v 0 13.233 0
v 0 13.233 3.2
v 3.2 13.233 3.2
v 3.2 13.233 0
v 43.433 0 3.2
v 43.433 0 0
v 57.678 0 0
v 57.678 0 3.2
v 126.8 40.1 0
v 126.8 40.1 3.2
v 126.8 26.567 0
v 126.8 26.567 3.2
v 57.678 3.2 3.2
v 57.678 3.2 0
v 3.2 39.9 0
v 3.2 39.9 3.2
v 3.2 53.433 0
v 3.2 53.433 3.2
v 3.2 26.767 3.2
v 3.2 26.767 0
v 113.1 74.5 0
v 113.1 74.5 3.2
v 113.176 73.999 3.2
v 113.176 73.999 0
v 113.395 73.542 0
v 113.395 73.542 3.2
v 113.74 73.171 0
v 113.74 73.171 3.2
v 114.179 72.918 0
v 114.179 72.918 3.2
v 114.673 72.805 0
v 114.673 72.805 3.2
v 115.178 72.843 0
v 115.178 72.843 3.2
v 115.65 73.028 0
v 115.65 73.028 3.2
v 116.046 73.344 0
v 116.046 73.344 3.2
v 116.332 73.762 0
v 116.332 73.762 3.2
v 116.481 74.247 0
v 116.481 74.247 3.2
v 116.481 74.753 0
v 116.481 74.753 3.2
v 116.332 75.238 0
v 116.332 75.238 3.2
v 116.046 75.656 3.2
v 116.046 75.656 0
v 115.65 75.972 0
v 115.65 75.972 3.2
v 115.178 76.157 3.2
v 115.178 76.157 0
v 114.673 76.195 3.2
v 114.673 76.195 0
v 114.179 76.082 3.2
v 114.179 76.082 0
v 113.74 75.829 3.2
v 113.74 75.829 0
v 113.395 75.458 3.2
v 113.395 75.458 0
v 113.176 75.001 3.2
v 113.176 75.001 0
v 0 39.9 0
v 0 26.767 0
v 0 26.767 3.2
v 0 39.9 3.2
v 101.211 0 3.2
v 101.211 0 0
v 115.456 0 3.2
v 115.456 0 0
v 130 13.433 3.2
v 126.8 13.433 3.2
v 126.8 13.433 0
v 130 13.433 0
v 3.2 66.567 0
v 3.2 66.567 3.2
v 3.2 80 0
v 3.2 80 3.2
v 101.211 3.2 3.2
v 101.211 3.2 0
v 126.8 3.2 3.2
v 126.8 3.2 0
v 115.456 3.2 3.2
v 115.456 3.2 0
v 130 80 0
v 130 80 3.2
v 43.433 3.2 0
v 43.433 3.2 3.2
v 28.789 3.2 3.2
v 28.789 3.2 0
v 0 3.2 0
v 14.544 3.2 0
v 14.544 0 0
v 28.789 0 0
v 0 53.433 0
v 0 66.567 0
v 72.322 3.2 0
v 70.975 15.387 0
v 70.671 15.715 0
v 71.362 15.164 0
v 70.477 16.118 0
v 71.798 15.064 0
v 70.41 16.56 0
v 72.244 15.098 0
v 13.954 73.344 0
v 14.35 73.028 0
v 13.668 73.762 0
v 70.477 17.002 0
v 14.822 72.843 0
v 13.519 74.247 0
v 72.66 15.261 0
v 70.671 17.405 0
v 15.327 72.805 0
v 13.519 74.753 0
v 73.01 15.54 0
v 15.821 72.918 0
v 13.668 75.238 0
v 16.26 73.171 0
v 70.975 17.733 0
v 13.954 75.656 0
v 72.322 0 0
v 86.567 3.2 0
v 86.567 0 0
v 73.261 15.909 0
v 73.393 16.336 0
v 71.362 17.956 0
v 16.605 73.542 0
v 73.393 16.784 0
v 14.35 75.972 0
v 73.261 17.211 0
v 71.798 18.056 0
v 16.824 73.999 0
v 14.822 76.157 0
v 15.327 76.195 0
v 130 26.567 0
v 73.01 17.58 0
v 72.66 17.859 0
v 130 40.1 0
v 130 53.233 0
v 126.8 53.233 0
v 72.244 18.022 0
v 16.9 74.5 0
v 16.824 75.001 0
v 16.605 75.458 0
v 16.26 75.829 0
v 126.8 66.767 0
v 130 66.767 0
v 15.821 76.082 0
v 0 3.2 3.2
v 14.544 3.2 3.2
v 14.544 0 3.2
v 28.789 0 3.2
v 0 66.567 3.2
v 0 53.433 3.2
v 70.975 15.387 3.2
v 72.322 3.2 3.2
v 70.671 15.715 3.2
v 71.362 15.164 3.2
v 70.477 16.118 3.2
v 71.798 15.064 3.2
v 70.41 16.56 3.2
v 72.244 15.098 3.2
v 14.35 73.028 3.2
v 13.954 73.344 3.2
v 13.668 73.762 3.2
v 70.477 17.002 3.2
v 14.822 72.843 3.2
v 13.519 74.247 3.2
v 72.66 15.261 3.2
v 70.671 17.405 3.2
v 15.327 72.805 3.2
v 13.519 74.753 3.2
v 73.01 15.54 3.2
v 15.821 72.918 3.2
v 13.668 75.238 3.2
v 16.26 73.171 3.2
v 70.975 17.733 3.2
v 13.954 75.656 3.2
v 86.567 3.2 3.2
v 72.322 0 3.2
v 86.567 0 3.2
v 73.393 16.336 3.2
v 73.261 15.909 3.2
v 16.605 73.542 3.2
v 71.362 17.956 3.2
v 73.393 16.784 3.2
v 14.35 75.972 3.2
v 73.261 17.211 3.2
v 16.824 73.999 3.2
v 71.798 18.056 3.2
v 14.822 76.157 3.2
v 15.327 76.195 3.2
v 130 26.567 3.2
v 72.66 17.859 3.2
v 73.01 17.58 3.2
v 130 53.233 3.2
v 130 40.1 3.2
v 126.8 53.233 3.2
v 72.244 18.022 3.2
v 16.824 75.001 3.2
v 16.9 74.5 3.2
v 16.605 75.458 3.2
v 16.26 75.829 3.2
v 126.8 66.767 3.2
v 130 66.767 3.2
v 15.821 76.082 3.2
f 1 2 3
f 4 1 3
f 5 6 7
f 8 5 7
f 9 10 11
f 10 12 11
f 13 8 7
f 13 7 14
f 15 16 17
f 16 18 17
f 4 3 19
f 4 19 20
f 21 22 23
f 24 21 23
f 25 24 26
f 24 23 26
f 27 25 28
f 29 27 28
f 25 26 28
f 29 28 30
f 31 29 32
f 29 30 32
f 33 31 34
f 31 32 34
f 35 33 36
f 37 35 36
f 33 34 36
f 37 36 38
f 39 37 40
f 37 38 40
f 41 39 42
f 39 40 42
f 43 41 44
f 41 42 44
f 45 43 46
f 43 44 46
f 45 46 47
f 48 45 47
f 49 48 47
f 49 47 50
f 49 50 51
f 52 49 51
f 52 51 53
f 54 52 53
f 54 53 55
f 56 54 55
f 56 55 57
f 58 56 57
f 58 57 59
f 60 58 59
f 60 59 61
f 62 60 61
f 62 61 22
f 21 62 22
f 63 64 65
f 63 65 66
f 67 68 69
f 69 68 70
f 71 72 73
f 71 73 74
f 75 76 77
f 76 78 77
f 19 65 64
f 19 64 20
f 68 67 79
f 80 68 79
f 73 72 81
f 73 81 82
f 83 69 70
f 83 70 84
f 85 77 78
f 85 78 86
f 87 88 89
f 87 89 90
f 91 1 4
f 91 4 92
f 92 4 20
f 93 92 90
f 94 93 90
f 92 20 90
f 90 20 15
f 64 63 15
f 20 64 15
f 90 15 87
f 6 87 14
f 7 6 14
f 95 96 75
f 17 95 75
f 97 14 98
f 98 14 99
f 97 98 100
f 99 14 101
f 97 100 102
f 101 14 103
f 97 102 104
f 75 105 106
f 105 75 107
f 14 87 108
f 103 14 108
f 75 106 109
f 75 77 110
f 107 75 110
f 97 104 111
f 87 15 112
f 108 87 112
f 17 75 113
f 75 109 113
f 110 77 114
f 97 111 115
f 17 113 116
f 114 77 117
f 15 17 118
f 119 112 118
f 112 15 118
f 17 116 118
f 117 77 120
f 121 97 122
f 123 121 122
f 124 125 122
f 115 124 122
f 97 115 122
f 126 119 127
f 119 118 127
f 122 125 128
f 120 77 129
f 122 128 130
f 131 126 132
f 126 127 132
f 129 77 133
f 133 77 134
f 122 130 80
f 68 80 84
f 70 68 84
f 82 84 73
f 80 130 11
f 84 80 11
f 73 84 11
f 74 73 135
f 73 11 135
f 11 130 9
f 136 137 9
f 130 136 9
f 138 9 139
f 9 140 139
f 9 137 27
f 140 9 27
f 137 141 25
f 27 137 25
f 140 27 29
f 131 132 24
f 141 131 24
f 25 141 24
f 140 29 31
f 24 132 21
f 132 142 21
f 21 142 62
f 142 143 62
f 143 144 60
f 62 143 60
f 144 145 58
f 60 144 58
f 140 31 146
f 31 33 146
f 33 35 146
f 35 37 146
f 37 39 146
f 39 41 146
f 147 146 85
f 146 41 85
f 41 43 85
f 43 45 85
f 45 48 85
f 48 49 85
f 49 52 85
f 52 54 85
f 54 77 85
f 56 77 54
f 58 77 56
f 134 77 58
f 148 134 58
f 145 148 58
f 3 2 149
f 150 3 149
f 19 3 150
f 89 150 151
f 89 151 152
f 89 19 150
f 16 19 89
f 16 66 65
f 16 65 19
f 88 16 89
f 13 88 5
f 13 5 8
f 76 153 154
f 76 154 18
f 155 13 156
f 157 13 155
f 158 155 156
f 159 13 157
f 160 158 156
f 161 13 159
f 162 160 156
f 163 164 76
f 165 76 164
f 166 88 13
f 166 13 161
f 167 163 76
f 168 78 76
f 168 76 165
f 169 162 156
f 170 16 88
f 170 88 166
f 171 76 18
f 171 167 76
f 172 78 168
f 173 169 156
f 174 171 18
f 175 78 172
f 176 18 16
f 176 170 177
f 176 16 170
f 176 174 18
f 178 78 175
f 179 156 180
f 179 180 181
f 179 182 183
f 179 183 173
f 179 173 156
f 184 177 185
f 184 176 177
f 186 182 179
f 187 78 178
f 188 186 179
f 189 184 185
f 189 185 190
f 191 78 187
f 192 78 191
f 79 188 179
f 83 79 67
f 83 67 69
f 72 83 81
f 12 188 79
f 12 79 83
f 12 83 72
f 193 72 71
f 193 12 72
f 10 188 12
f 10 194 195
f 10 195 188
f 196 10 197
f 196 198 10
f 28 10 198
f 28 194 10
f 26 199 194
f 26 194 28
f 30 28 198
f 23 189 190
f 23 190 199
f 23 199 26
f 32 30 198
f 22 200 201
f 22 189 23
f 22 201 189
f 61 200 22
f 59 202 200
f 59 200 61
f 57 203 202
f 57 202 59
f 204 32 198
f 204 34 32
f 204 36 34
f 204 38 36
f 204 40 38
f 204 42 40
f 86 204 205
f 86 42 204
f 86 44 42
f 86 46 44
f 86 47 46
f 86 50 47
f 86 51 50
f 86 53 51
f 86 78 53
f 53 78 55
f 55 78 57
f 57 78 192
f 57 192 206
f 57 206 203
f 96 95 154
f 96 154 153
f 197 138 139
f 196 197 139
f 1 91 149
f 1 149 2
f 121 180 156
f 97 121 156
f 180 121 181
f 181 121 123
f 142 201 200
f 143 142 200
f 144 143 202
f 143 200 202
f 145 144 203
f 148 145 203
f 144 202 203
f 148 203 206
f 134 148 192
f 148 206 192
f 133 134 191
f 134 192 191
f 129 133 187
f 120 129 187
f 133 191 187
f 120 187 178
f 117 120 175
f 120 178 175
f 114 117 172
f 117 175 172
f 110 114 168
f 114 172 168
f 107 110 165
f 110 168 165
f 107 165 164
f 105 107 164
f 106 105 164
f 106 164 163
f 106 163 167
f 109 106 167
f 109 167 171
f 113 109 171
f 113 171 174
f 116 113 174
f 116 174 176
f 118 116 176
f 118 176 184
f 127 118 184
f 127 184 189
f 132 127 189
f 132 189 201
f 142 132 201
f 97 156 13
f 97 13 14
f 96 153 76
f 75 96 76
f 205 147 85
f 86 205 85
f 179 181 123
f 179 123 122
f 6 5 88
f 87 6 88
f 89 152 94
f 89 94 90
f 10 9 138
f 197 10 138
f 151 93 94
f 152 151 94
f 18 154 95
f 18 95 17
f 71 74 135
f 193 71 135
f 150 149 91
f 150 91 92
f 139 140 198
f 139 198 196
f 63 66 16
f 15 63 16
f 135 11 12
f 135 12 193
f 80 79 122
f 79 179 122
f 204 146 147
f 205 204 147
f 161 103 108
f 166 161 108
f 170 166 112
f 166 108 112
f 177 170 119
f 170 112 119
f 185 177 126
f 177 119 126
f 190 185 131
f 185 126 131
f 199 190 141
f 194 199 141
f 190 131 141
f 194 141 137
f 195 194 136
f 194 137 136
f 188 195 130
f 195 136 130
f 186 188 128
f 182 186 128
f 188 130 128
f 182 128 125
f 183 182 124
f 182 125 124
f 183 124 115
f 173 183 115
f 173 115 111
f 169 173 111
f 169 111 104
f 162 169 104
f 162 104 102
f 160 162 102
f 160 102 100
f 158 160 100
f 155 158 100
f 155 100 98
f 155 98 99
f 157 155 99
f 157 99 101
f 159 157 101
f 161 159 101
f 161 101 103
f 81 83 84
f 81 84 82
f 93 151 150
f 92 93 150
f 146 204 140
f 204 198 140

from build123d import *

# Parameters (mm, degrees)
SKETCH1_W           = 130
SKETCH1_H           = 80
BOSS_EXTRUDE1_DEPTH = 3.2
SKETCH2_W           = 14.444444444
SKETCH2_H           = 3.2
SKETCH2_W_2         = 3.2
SKETCH2_H_2         = 13.333333334
SKETCH2_H_3         = 13.333333333
CUT_EXTRUDE1_DEPTH  = 153.676913775
MOVE_FACE1_BY       = 0.1
MOVE_FACE1_2_BY     = 0.1
MOVE_FACE1_3_BY     = 0.1
MOVE_FACE1_4_BY     = 0.1
MOVE_FACE1_5_BY     = 0.1
MOVE_FACE1_6_BY     = 0.1
MOVE_FACE1_7_BY     = 0.1
MOVE_FACE1_8_BY     = 0.1
MOVE_FACE1_9_BY     = 0.1
MOVE_FACE1_10_BY    = 0.1
MOVE_FACE1_11_BY    = 0.1
MOVE_FACE1_12_BY    = 0.1
MOVE_FACE1_13_BY    = 0.1
MOVE_FACE1_14_BY    = 0.1
MOVE_FACE1_15_BY    = 0.1
MOVE_FACE1_16_BY    = 0.1
MOVE_FACE1_17_BY    = 0.1
MOVE_FACE1_18_BY    = 0.1
CUT_EXTRUDE2_REACH  = 154.677
SKETCH3_R           = 1.7
CUT_EXTRUDE3_REACH  = 154.677
SKETCH4_R           = 1.5


with BuildPart() as part:
    # Sketch1 → Boss-Extrude1 (new body)
    with BuildSketch(Plane.XY):
        with Locations((65, 40)):
            Rectangle(SKETCH1_W, SKETCH1_H)
    extrude(amount=BOSS_EXTRUDE1_DEPTH)

    # Sketch2 → Cut-Extrude1 (cut, through all)
    with BuildSketch(Plane.XY.offset(3.2)):
        with Locations((7.222222222, 1.6)):
            Rectangle(SKETCH2_W, SKETCH2_H)
        with Locations((36.111111111, 1.6)):
            Rectangle(SKETCH2_W, SKETCH2_H)
        with Locations((65, 1.6)):
            Rectangle(SKETCH2_W, SKETCH2_H)
        with Locations((93.888888889, 1.6)):
            Rectangle(SKETCH2_W, SKETCH2_H)
        Polygon((115.555555556, 0), (115.555555556, 3.2), (126.8, 3.2), (126.8, 13.333333333), (130, 13.333333333), (130, 0), align=None)
        with Locations((1.6, 20)):
            Rectangle(SKETCH2_W_2, SKETCH2_H_2)
        with Locations((1.6, 46.666666667)):
            Rectangle(SKETCH2_W_2, SKETCH2_H_3)
        with Locations((1.6, 73.333333334)):
            Rectangle(SKETCH2_W_2, SKETCH2_H_3)
        with Locations((128.4, 33.333333334)):
            Rectangle(SKETCH2_W_2, SKETCH2_H_3)
        with Locations((128.4, 60)):
            Rectangle(SKETCH2_W_2, SKETCH2_H_2)
    extrude(amount=-CUT_EXTRUDE1_DEPTH, mode=Mode.SUBTRACT)

    # Move Face1: a face moved inward by 0.1
    extrude(part.faces().sort_by_distance((128.4, 53.333333333, 1.6))[0], amount=MOVE_FACE1_BY, dir=(0, -1, 0), mode=Mode.SUBTRACT)

    # Move Face1 2: a face moved inward by 0.1
    extrude(part.faces().sort_by_distance((128.4, 26.666666667, 1.6))[0], amount=MOVE_FACE1_2_BY, dir=(0, -1, 0), mode=Mode.SUBTRACT)

    # Move Face1 3: a face moved inward by 0.1
    extrude(part.faces().sort_by_distance((128.4, 13.333333333, 1.6))[0], amount=MOVE_FACE1_3_BY, dir=(0, 1, 0), mode=Mode.SUBTRACT)

    # Move Face1 4: a face moved inward by 0.1
    extrude(part.faces().sort_by_distance((128.4, 40, 1.6))[0], amount=MOVE_FACE1_4_BY, dir=(0, 1, 0), mode=Mode.SUBTRACT)

    # Move Face1 5: a face moved inward by 0.1
    extrude(part.faces().sort_by_distance((128.4, 66.666666667, 1.6))[0], amount=MOVE_FACE1_5_BY, dir=(0, 1, 0), mode=Mode.SUBTRACT)

    # Move Face1 6: a face moved inward by 0.1
    extrude(part.faces().sort_by_distance((115.555555556, 1.6, 1.6))[0], amount=MOVE_FACE1_6_BY, dir=(-1, 0, 0), mode=Mode.SUBTRACT)

    # Move Face1 7: a face moved inward by 0.1
    extrude(part.faces().sort_by_distance((86.666666667, 1.6, 1.6))[0], amount=MOVE_FACE1_7_BY, dir=(-1, 0, 0), mode=Mode.SUBTRACT)

    # Move Face1 8: a face moved inward by 0.1
    extrude(part.faces().sort_by_distance((57.777777778, 1.6, 1.6))[0], amount=MOVE_FACE1_8_BY, dir=(-1, 0, 0), mode=Mode.SUBTRACT)

    # Move Face1 9: a face moved inward by 0.1
    extrude(part.faces().sort_by_distance((28.888888889, 1.6, 1.6))[0], amount=MOVE_FACE1_9_BY, dir=(-1, 0, 0), mode=Mode.SUBTRACT)

    # Move Face1 10: a face moved inward by 0.1
    extrude(part.faces().sort_by_distance((14.444444444, 1.6, 1.6))[0], amount=MOVE_FACE1_10_BY, dir=(1, 0, 0), mode=Mode.SUBTRACT)

    # Move Face1 11: a face moved inward by 0.1
    extrude(part.faces().sort_by_distance((43.333333333, 1.6, 1.6))[0], amount=MOVE_FACE1_11_BY, dir=(1, 0, 0), mode=Mode.SUBTRACT)

    # Move Face1 12: a face moved inward by 0.1
    extrude(part.faces().sort_by_distance((72.222222222, 1.6, 1.6))[0], amount=MOVE_FACE1_12_BY, dir=(1, 0, 0), mode=Mode.SUBTRACT)

    # Move Face1 13: a face moved inward by 0.1
    extrude(part.faces().sort_by_distance((101.111111111, 1.6, 1.6))[0], amount=MOVE_FACE1_13_BY, dir=(1, 0, 0), mode=Mode.SUBTRACT)

    # Move Face1 14: a face moved inward by 0.1
    extrude(part.faces().sort_by_distance((1.6, 26.666666667, 1.6))[0], amount=MOVE_FACE1_14_BY, dir=(0, 1, 0), mode=Mode.SUBTRACT)

    # Move Face1 15: a face moved inward by 0.1
    extrude(part.faces().sort_by_distance((1.6, 13.333333333, 1.6))[0], amount=MOVE_FACE1_15_BY, dir=(0, -1, 0), mode=Mode.SUBTRACT)

    # Move Face1 16: a face moved inward by 0.1
    extrude(part.faces().sort_by_distance((1.6, 40, 1.6))[0], amount=MOVE_FACE1_16_BY, dir=(0, -1, 0), mode=Mode.SUBTRACT)

    # Move Face1 17: a face moved inward by 0.1
    extrude(part.faces().sort_by_distance((1.6, 53.333333333, 1.6))[0], amount=MOVE_FACE1_17_BY, dir=(0, 1, 0), mode=Mode.SUBTRACT)

    # Move Face1 18: a face moved inward by 0.1
    extrude(part.faces().sort_by_distance((1.6, 66.666666667, 1.6))[0], amount=MOVE_FACE1_18_BY, dir=(0, -1, 0), mode=Mode.SUBTRACT)

    # Sketch3 → Cut-Extrude2 (cut, up to next)
    with BuildSketch(Plane.XY.offset(3.2), mode=Mode.PRIVATE) as cut_extrude2_sk1:
        with Locations((15.2, 74.5)):
            Circle(SKETCH3_R)
    cut_extrude2_tool1 = extrude(cut_extrude2_sk1.sketch, amount=-CUT_EXTRUDE2_REACH, mode=Mode.PRIVATE) & part.part
    # Sketch3 → Cut-Extrude2 (cut, up to next)
    with BuildSketch(Plane.XY.offset(3.2), mode=Mode.PRIVATE) as cut_extrude2_sk2:
        with Locations(Location((114.8, 74.5, 0), (0, 0, 180))):
            Circle(SKETCH3_R)
    cut_extrude2_tool2 = extrude(cut_extrude2_sk2.sketch, amount=-CUT_EXTRUDE2_REACH, mode=Mode.PRIVATE) & part.part
    add(cut_extrude2_tool1.solids().sort_by_distance((15.2, 74.5, 3.2))[0], mode=Mode.SUBTRACT)
    add(cut_extrude2_tool2.solids().sort_by_distance((114.8, 74.5, 3.2))[0], mode=Mode.SUBTRACT)

    # Sketch4 → Cut-Extrude3 (cut, up to next)
    with BuildSketch(Plane(origin=(0, 0, 0), x_dir=(-1, 0, 0), z_dir=(0, 0, -1)), mode=Mode.PRIVATE) as cut_extrude3_sk1:
        with Locations((-71.91, 16.56)):
            Circle(SKETCH4_R)
    cut_extrude3_tool1 = extrude(cut_extrude3_sk1.sketch, amount=-CUT_EXTRUDE3_REACH, mode=Mode.PRIVATE) & part.part
    add(cut_extrude3_tool1.solids().sort_by_distance((71.91, 16.56, 0))[0], mode=Mode.SUBTRACT)


solid = part.part
